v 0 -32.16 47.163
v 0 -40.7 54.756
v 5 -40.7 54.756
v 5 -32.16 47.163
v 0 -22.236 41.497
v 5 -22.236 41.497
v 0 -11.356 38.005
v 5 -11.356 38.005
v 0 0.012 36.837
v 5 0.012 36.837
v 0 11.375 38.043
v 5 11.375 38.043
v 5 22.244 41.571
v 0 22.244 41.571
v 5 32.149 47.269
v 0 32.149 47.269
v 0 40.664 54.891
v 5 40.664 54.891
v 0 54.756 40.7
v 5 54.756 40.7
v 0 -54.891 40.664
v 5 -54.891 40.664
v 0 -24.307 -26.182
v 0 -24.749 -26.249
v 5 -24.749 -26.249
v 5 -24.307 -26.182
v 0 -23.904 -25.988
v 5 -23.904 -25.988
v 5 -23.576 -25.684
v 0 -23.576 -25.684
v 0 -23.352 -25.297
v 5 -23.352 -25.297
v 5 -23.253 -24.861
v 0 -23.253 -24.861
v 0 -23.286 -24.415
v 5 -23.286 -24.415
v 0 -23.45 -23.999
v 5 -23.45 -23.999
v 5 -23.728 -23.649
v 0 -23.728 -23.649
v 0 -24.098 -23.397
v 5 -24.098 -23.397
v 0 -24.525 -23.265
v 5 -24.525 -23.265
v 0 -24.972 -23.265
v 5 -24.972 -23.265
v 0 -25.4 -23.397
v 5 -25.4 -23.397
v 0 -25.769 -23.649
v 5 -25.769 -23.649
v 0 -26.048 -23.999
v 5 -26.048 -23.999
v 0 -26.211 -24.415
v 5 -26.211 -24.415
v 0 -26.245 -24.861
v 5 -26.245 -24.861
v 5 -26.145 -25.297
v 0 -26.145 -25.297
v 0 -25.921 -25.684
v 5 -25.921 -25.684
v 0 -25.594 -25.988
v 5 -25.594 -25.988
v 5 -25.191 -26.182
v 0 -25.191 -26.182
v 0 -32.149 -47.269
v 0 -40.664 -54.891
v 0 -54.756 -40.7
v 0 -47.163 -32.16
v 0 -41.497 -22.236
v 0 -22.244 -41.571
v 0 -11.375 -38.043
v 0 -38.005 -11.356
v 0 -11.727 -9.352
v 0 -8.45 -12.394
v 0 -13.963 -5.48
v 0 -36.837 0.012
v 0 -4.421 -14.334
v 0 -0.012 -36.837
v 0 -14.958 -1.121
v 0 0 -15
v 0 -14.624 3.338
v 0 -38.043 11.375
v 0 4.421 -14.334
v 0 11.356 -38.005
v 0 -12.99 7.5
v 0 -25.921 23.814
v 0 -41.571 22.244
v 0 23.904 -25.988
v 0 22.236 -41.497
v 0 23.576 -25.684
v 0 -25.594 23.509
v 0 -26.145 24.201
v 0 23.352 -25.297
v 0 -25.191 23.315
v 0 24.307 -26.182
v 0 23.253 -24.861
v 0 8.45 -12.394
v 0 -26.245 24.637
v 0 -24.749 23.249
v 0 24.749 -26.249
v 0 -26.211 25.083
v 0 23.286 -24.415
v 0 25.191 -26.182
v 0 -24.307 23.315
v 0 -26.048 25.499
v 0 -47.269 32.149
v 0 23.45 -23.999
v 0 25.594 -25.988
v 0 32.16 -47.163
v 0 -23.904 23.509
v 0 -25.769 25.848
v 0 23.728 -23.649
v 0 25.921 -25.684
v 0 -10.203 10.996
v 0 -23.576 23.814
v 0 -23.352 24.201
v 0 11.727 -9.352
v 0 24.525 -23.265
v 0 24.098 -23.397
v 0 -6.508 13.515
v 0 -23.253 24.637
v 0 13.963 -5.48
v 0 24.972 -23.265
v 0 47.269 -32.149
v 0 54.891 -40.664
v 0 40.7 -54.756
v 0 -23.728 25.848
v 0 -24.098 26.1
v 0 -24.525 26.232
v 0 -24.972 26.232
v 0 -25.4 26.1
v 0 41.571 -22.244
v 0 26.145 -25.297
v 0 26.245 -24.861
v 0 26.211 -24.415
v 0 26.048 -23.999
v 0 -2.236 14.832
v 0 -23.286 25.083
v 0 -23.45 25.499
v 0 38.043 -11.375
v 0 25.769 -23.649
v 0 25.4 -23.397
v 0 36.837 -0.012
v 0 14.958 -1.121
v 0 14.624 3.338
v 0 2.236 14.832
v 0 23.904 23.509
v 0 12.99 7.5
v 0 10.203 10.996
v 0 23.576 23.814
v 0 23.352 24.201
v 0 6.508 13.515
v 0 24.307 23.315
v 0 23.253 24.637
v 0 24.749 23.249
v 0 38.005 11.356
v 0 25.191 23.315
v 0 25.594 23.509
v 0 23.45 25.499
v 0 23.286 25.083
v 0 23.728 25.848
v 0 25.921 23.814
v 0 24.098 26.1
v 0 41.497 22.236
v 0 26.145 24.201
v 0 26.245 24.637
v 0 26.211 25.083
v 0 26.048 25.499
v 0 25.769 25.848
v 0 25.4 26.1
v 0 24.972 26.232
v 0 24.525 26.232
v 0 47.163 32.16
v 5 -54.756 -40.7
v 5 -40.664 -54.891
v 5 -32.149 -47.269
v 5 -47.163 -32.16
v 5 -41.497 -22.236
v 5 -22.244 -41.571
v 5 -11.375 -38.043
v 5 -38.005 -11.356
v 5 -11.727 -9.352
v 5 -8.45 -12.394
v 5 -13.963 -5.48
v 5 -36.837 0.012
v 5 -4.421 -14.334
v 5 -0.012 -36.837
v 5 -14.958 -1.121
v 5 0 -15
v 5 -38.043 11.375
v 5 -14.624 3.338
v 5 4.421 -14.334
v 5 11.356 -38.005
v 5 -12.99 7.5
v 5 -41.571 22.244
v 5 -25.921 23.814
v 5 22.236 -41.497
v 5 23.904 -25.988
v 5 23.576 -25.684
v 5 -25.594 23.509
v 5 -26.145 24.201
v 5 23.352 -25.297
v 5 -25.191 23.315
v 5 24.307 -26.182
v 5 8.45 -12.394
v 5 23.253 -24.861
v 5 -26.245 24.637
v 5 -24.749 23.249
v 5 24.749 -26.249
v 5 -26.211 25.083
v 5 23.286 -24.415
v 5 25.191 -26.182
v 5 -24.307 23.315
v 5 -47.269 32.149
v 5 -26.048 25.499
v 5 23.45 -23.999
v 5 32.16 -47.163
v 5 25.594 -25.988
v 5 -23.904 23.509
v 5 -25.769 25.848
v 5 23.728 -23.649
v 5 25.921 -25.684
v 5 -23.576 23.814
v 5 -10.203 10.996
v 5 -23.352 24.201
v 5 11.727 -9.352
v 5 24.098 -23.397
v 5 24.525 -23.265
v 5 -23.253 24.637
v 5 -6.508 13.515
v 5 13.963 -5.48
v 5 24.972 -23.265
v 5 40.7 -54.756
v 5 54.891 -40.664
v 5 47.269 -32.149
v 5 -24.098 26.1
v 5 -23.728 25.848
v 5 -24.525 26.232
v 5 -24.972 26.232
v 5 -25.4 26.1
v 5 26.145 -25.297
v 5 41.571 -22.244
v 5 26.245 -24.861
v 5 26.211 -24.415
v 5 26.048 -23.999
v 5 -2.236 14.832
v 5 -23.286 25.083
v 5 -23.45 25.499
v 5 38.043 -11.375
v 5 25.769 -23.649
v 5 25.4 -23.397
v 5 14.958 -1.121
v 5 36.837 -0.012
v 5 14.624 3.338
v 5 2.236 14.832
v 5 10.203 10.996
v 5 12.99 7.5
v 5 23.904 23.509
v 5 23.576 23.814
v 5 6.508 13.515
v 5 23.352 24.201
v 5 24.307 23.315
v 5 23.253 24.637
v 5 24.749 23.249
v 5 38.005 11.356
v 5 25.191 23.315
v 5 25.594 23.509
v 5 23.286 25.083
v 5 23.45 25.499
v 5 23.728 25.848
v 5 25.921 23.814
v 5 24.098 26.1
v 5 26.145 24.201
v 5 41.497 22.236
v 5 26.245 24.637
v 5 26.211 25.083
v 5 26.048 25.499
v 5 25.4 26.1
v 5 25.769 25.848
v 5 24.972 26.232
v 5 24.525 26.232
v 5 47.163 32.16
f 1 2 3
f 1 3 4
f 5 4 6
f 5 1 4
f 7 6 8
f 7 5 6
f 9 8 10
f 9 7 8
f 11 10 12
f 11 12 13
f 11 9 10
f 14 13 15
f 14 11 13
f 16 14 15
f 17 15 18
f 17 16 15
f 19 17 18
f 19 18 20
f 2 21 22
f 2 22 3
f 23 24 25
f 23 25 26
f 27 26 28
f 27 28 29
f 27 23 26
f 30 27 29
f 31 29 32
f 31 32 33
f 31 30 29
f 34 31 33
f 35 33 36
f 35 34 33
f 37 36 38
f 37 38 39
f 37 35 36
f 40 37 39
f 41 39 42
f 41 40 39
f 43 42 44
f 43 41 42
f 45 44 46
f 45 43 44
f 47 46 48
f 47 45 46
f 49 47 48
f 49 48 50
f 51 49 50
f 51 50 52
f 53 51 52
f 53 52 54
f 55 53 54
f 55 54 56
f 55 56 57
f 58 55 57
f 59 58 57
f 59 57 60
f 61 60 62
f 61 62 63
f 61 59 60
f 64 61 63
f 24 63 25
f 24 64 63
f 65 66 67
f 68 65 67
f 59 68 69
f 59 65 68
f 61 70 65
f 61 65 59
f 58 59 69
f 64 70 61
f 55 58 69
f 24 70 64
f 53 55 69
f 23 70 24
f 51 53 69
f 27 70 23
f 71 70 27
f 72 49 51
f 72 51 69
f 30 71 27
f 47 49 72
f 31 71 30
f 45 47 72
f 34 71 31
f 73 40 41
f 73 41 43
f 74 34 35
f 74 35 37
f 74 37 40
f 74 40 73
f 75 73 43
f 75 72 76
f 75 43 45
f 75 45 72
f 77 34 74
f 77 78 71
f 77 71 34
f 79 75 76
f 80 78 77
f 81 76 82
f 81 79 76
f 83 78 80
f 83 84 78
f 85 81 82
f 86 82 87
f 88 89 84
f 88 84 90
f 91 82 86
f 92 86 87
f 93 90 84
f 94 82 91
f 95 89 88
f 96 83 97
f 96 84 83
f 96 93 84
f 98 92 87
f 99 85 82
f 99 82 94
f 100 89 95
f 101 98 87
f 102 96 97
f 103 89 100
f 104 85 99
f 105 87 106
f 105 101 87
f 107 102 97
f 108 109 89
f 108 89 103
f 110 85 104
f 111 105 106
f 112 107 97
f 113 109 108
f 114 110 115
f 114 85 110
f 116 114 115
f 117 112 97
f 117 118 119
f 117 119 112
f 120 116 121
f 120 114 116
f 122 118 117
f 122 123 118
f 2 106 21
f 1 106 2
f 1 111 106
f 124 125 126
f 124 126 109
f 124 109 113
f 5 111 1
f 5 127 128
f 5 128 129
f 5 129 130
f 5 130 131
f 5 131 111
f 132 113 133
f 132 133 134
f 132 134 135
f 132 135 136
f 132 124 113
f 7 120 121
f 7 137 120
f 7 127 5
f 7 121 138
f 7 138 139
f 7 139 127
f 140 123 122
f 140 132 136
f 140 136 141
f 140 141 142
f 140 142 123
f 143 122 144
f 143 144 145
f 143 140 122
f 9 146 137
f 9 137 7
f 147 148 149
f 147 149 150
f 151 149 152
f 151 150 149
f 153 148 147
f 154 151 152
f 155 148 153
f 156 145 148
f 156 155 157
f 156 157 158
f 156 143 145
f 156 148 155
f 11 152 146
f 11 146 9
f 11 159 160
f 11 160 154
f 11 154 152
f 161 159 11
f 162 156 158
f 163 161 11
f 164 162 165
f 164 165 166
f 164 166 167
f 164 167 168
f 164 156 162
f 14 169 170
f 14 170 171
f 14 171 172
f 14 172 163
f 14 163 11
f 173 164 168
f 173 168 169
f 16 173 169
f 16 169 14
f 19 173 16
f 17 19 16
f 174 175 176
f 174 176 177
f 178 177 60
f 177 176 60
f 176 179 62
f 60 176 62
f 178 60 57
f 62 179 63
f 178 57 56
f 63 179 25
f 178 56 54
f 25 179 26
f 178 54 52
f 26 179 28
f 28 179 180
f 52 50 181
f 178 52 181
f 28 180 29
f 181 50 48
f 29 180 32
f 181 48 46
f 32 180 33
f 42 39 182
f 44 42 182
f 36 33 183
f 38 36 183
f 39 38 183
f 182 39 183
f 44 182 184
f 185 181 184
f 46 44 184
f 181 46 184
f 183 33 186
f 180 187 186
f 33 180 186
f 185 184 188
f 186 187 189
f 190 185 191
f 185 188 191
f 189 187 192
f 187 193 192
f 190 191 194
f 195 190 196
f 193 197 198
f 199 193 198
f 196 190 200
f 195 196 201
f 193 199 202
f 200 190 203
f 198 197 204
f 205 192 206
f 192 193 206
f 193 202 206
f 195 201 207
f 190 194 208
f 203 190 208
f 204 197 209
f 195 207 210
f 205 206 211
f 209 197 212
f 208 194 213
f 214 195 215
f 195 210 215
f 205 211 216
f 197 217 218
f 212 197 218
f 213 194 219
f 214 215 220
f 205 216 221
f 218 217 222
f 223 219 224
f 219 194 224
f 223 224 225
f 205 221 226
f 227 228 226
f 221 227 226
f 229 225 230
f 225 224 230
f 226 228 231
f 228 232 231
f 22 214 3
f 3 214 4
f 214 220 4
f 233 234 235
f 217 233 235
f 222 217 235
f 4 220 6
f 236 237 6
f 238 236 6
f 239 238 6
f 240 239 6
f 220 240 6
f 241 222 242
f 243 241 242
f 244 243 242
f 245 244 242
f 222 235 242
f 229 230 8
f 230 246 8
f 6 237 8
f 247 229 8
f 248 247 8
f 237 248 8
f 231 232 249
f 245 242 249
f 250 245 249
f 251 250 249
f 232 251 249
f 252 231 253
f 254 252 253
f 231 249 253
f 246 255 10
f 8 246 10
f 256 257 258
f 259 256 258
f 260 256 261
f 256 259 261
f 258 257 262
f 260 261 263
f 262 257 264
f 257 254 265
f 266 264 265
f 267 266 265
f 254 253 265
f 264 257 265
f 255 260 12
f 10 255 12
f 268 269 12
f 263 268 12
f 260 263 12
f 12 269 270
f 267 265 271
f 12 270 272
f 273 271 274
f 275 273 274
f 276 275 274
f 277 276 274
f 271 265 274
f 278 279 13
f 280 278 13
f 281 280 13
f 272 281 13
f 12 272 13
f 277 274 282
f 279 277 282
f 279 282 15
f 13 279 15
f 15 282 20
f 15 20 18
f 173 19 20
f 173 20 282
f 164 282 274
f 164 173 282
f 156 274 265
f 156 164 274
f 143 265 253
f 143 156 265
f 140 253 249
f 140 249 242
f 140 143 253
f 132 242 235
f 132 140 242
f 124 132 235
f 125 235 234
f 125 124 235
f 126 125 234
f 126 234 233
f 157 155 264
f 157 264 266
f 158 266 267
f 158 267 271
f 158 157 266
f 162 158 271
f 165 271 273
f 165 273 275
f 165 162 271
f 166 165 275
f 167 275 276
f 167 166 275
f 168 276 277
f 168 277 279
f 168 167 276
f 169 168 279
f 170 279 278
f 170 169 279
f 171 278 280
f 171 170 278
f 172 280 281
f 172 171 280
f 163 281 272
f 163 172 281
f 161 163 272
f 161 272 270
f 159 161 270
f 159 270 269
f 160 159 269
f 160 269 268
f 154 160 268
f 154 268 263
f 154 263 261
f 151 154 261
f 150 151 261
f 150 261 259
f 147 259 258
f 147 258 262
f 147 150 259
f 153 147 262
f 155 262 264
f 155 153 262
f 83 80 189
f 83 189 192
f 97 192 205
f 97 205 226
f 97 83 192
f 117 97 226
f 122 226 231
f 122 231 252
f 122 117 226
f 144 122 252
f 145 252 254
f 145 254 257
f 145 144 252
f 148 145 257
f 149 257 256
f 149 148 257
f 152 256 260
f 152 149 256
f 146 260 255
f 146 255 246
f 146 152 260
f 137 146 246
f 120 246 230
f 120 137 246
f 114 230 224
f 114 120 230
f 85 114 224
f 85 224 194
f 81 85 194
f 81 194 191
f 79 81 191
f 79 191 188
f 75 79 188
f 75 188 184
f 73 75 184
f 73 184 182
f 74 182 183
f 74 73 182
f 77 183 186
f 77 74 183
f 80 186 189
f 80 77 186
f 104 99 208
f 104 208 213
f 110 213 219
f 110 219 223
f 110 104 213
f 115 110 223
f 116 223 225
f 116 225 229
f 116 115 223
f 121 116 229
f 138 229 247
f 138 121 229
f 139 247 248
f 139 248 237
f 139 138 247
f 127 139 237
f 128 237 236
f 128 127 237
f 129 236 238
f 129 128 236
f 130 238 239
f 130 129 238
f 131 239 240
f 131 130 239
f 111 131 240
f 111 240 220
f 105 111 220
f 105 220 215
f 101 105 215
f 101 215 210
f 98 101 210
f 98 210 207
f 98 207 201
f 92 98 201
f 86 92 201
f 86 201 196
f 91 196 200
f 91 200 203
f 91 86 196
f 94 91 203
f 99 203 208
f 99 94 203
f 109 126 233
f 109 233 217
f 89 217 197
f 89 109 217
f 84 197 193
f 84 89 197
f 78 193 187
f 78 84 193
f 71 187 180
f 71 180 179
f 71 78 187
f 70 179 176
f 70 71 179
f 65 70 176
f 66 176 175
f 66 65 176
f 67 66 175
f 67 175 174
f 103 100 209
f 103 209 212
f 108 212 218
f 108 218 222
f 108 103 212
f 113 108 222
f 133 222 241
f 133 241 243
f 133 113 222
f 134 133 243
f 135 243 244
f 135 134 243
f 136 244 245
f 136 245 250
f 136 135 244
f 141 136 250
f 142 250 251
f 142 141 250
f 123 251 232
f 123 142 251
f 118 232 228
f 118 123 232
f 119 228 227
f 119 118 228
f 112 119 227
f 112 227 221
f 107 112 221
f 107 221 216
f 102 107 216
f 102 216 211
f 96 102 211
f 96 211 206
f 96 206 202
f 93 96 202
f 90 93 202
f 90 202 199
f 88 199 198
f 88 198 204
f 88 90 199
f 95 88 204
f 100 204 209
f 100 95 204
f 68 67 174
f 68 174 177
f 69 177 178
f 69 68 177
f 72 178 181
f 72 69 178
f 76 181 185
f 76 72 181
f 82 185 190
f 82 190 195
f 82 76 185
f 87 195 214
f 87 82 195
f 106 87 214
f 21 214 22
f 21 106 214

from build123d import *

# Parameters (mm, degrees)
SKETCH_1_R      = 15
SKETCH_1_R_2    = 1.5
EXTRUDE_1_DEPTH = 5


with BuildPart() as part:
    # 草图1 → 凸台-拉伸1 (new body)
    with BuildSketch(Plane(origin=(0, 0, 0), x_dir=(0, 0, -1), z_dir=(1, 0, 0))):
        with BuildLine():
            Line((-54.891168705, 40.66351007), (-40.699692853, 54.756132721))
            ThreePointArc((-40.699692853, 54.756132721), (0.011760124, 36.837223596), (40.66351007, 54.891168705))
            Line((40.66351007, 54.891168705), (54.756132721, 40.699692853))
            ThreePointArc((54.756132721, 40.699692853), (36.837223596, -0.011760124), (54.891168705, -40.66351007))
            Line((54.891168705, -40.66351007), (40.699692853, -54.756132721))
            ThreePointArc((40.699692853, -54.756132721), (-0.011760124, -36.837223596), (-40.66351007, -54.891168705))
            Line((-40.66351007, -54.891168705), (-54.756132721, -40.699692853))
            ThreePointArc((-54.756132721, -40.699692853), (-36.837223596, 0.011760124), (-54.891168705, 40.66351007))
        make_face()
        Circle(SKETCH_1_R, mode=Mode.SUBTRACT)
        with Locations((24.748737342, 24.748737342)):
            Circle(SKETCH_1_R_2, mode=Mode.SUBTRACT)
        with Locations((24.748737342, -24.748737342)):
            Circle(SKETCH_1_R_2, mode=Mode.SUBTRACT)
        with Locations((-24.748737342, -24.748737342)):
            Circle(SKETCH_1_R_2, mode=Mode.SUBTRACT)
        with Locations((-24.748737342, 24.748737342)):
            Circle(SKETCH_1_R_2, mode=Mode.SUBTRACT)
    extrude(amount=EXTRUDE_1_DEPTH)


solid = part.part
